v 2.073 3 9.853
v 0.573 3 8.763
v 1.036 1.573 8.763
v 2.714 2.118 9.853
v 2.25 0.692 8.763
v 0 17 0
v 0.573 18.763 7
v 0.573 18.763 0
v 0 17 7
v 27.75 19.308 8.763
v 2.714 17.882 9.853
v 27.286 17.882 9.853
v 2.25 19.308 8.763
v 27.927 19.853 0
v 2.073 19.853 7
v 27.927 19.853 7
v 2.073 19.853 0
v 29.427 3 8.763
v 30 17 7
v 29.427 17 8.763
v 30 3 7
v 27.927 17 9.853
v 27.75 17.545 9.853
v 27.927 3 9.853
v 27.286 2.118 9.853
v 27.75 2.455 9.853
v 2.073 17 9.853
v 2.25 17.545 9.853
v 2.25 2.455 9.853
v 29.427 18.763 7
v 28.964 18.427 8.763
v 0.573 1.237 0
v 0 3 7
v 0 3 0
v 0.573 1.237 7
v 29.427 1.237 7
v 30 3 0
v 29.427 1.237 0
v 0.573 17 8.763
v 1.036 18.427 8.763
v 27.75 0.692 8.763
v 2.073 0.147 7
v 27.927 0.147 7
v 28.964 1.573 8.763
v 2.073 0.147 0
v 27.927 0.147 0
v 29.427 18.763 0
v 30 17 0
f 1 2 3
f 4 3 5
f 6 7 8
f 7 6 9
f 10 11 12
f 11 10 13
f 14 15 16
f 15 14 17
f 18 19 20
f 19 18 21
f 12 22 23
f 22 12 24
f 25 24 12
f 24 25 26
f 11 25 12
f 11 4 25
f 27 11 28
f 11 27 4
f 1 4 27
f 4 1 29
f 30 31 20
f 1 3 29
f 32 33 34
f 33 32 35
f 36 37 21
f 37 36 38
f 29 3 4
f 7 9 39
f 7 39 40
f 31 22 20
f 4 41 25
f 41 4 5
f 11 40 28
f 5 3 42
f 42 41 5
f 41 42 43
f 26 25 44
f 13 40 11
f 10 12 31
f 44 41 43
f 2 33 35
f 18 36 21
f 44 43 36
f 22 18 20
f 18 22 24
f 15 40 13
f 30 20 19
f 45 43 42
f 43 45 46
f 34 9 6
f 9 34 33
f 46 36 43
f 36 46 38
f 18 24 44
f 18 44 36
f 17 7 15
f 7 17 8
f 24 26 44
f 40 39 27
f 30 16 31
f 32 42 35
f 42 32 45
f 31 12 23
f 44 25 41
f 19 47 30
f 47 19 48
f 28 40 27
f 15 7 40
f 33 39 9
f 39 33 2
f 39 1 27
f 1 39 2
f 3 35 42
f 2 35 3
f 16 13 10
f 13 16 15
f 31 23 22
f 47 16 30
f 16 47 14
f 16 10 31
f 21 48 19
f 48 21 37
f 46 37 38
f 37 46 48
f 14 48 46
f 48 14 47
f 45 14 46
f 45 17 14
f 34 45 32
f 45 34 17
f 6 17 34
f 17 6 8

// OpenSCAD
// Example:
roundedCube(
  x = 30,
  y = 20,
  z = 10,
  r = 3,
  flatBottom = true
);

module roundedCube(
  x,
  y,
  z,
  r = 0,
  flatTop = false,
  flatBottom = false,
  flatLeft = false,
  flatRight = false,
  flatFront = false,
  flatBack = false,
  center = false
) {

  // Calculate [ x, y, z ] compensations based on requested roundings:
  rX = r * (flatLeft && flatRight ? 0 : (flatLeft || flatRight ? 1 : 2));
  rY = r * (flatFront && flatBack ? 0 : (flatFront || flatBack ? 1 : 2));
  rZ = r * (flatTop && flatBottom ? 0 : (flatTop || flatBottom ? 1 : 2));

  // Do some sanity checks:
  if (x - rX <= 0) {
    echo("<b style='color: red'>WARNING</b>: roundedCube() is too small along its x-axis");
  }
  if (y - rY <= 0) {
    echo("<b style='color: red'>WARNING</b>: roundedCube() is too small along its y-axis");
  }
  if (z - rZ <= 0) {
    echo("<b style='color: red'>WARNING</b>: roundedCube() is too small along its z-axis");
  }

  translate([ center ? x / -2 : 0, center ? y / -2 : 0, 0 ])
  difference() {

    // Main rounded cube:
    translate([
      flatLeft ? 0 : r,
      flatFront ? 0 : r,
      flatBottom ? 0 : r
    ]) {
      minkowski() {
        cube([
          x - rX,
          y - rY,
          z - rZ
        ]);
        sphere(r = r);
      }
    }

    // Optional cutouts:
    // (let's not generate unnecessary geometry)
    if (flatTop) {
      translate([ x / -2, y / -2, z ])
      cube([ x * 2, y * 2, z ]);
    }
    if (flatBottom) {
      translate([ x / -2, y / -2, -z ])
      cube([ x * 2, y * 2, z ]);
    }
    if (flatLeft) {
      translate([ -x, y / -2, z / -2 ])
      cube([ x, y * 2, z * 2 ]);
    }
    if (flatRight) {
      translate([ x, y / -2, z / -2 ])
      cube([ x, y * 2, z * 2 ]);
    }
    if (flatFront) {
      translate([ x / -2, -y, z / -2 ])
      cube([ x * 2, y, z * 2 ]);
    }
    if (flatBack) {
      translate([ x / -2, y, z / -2 ])
      cube([ x * 2, y, z * 2 ]);
    }

  }

}
